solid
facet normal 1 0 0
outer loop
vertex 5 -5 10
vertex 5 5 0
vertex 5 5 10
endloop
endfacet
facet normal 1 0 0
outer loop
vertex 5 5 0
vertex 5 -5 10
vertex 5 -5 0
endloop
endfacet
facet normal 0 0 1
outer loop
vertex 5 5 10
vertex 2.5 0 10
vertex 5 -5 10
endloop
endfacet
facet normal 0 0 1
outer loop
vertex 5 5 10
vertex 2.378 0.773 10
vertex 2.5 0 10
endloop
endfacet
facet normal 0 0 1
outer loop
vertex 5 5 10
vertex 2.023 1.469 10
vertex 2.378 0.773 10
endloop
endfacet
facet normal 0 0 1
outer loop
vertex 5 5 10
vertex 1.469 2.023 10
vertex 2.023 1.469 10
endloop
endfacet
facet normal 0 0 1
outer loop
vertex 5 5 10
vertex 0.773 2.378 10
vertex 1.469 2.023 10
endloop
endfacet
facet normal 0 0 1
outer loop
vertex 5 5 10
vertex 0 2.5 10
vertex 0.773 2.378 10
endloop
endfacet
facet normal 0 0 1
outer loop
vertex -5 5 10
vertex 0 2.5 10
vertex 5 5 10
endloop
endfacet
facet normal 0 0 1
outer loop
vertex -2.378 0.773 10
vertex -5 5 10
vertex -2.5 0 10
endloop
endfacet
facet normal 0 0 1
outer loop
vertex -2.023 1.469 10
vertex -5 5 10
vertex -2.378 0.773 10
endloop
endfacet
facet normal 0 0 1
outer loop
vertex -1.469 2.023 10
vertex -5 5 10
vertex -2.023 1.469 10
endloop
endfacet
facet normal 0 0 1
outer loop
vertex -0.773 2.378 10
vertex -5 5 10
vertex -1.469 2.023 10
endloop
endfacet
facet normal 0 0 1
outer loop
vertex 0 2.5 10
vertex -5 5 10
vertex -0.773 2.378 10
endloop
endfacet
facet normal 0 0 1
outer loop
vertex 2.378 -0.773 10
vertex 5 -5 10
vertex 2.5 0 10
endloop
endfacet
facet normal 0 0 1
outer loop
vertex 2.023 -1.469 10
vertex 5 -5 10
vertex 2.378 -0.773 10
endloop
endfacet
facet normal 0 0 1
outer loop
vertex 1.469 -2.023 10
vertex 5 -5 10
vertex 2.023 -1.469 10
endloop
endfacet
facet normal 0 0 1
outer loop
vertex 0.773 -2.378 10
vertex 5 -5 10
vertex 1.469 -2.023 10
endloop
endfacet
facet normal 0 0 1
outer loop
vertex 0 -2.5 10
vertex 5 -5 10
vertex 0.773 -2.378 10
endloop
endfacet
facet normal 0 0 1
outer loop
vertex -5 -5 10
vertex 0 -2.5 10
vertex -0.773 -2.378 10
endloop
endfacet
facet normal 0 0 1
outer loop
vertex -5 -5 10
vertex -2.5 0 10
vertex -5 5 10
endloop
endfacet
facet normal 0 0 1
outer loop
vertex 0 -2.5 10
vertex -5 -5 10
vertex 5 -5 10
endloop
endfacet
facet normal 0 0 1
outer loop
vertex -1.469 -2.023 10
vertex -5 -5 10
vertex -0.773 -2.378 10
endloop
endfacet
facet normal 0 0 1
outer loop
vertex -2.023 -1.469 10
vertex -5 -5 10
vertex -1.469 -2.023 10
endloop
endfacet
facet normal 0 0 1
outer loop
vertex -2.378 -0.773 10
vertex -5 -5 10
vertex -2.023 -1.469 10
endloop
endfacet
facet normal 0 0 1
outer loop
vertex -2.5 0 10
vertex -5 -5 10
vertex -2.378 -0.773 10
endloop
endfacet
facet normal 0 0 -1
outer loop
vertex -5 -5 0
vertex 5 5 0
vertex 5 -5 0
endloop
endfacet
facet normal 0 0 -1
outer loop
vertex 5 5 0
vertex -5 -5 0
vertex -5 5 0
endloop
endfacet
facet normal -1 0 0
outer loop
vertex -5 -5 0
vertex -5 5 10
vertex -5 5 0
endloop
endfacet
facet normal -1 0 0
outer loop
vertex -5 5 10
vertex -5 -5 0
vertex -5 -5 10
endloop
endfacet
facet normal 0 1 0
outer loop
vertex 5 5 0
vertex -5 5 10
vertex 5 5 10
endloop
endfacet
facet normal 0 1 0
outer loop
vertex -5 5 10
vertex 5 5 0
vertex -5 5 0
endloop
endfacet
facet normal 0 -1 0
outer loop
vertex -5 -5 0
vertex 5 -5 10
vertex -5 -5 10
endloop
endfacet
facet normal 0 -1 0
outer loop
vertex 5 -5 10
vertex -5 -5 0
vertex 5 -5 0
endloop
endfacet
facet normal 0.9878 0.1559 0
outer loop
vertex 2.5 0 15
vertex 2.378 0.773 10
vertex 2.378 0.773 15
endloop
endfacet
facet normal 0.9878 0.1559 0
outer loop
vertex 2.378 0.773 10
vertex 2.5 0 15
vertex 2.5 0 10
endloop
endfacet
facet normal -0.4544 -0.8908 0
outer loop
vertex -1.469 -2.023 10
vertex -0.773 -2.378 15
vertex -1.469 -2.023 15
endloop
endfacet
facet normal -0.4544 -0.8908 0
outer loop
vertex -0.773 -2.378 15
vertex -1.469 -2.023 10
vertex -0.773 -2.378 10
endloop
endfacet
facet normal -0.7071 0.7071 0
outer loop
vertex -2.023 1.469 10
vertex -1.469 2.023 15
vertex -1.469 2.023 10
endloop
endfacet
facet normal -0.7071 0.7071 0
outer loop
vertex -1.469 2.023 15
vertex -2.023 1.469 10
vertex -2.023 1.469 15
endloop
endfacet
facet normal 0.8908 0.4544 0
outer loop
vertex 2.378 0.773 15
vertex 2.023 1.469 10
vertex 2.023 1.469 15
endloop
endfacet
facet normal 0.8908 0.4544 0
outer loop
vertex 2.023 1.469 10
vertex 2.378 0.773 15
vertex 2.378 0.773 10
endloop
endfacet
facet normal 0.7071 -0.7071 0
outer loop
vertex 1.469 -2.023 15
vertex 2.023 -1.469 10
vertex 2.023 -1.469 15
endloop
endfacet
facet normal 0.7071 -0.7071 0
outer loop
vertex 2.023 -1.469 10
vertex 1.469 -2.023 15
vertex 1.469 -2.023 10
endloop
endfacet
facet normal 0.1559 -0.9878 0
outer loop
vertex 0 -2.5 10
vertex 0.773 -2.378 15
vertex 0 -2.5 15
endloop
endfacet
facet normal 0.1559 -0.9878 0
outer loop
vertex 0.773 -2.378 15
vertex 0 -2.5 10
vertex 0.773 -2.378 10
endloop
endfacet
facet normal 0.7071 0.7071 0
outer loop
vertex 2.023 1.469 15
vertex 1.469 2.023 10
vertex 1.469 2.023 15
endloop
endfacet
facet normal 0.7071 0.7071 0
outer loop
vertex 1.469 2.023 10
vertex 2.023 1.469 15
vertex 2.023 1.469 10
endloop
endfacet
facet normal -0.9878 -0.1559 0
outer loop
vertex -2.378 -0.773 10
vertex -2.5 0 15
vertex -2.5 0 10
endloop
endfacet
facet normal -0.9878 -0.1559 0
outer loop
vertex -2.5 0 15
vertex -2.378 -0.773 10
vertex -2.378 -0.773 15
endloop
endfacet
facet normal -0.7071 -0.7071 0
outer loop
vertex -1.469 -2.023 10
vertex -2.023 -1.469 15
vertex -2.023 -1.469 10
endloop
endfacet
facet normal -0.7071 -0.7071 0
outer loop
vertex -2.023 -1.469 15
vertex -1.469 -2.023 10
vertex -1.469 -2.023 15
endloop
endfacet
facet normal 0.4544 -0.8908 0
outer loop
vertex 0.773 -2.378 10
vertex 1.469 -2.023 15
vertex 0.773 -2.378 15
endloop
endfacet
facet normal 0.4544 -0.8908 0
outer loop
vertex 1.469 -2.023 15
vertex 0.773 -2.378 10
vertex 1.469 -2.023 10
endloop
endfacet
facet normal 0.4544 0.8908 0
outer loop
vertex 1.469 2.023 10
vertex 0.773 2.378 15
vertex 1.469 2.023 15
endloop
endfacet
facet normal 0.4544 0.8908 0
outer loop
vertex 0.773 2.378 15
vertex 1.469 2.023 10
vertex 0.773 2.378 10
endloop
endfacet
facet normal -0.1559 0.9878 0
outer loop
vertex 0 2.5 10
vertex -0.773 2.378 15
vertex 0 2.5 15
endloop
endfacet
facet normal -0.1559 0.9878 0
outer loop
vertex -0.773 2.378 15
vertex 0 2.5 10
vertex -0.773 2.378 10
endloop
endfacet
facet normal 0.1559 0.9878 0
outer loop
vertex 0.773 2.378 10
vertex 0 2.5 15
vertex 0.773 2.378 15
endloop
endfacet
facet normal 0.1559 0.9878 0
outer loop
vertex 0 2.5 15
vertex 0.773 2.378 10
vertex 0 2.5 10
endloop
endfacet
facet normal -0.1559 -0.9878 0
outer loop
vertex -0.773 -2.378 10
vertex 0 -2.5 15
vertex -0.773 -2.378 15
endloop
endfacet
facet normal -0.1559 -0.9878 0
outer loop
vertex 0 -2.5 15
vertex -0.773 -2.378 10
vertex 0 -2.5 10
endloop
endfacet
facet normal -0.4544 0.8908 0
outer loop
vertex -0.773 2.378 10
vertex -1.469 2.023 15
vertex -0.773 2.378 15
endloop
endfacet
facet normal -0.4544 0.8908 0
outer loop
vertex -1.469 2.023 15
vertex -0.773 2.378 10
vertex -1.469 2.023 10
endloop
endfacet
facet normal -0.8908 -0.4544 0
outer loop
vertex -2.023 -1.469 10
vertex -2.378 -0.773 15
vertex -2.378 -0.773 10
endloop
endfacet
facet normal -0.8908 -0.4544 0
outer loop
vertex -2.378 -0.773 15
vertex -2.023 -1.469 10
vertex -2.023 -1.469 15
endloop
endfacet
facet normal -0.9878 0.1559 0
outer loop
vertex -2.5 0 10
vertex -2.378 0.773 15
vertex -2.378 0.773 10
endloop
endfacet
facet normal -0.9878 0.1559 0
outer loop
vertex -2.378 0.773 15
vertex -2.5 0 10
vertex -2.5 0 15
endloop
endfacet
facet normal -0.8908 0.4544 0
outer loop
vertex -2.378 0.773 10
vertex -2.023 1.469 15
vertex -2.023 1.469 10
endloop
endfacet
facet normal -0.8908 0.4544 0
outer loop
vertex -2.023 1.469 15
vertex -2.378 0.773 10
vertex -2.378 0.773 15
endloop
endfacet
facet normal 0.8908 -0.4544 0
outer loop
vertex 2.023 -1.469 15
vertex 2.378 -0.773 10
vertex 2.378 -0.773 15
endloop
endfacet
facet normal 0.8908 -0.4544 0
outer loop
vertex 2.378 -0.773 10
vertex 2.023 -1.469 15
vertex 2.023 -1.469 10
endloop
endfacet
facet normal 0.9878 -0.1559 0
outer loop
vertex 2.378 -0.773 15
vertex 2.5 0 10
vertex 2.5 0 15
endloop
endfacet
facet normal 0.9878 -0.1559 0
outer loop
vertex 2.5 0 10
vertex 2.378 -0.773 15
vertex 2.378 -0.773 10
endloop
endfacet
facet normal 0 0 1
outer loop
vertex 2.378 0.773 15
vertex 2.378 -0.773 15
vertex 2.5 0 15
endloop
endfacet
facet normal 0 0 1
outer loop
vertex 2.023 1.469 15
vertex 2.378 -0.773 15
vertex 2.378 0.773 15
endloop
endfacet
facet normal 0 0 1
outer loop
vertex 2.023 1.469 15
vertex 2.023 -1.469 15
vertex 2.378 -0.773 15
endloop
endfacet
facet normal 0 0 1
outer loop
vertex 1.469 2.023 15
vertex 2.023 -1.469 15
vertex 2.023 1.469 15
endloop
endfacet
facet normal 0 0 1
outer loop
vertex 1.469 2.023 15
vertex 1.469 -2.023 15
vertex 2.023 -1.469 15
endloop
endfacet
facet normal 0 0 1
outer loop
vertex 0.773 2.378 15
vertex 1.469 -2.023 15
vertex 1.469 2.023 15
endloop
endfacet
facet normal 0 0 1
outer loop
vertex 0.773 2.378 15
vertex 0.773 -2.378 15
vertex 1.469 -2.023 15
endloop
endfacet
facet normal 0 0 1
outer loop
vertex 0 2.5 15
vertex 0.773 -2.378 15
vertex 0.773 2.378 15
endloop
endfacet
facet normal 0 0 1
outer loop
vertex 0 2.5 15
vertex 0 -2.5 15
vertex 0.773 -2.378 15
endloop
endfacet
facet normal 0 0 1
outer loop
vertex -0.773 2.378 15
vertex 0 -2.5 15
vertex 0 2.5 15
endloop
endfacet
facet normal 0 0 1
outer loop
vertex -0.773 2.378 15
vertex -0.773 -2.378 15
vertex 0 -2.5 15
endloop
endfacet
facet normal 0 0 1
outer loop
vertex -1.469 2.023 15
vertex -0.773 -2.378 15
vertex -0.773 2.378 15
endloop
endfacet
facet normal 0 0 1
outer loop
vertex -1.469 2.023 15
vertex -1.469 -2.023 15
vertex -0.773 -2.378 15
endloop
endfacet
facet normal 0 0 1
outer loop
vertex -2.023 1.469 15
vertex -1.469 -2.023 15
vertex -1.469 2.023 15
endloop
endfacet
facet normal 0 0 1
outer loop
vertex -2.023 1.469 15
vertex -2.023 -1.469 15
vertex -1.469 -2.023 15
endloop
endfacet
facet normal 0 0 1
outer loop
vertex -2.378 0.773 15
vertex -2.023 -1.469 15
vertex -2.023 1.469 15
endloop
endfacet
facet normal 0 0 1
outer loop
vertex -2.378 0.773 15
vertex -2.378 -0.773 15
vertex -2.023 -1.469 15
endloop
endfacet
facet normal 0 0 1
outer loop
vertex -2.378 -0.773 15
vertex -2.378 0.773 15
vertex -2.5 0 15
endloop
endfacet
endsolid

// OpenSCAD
$fn=20;

color("green")
  translate([0,0,5]) difference(){
    cube(10,true);
    cylinder(d=5,h=20,center=true);
  }

color("red") cylinder(d=5,h=15);
